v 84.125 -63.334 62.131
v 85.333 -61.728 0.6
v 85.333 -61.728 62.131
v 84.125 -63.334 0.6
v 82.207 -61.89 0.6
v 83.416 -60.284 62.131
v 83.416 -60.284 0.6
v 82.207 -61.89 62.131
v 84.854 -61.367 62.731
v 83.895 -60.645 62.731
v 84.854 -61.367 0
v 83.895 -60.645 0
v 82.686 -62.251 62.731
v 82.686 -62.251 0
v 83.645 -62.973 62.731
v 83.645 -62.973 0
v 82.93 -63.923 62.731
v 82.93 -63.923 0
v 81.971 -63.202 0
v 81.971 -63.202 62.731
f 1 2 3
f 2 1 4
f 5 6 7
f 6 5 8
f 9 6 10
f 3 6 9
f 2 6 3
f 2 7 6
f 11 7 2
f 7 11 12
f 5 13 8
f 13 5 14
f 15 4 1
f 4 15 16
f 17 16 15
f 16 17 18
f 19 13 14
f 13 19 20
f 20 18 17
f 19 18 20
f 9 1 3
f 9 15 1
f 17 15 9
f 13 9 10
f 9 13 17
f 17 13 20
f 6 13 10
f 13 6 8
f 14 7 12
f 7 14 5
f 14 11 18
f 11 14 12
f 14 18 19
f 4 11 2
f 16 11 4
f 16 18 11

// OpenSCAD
include <../lib/spool-drybox-lib.scad>;
$fn = 40;
panel_gasket("lid-back");
